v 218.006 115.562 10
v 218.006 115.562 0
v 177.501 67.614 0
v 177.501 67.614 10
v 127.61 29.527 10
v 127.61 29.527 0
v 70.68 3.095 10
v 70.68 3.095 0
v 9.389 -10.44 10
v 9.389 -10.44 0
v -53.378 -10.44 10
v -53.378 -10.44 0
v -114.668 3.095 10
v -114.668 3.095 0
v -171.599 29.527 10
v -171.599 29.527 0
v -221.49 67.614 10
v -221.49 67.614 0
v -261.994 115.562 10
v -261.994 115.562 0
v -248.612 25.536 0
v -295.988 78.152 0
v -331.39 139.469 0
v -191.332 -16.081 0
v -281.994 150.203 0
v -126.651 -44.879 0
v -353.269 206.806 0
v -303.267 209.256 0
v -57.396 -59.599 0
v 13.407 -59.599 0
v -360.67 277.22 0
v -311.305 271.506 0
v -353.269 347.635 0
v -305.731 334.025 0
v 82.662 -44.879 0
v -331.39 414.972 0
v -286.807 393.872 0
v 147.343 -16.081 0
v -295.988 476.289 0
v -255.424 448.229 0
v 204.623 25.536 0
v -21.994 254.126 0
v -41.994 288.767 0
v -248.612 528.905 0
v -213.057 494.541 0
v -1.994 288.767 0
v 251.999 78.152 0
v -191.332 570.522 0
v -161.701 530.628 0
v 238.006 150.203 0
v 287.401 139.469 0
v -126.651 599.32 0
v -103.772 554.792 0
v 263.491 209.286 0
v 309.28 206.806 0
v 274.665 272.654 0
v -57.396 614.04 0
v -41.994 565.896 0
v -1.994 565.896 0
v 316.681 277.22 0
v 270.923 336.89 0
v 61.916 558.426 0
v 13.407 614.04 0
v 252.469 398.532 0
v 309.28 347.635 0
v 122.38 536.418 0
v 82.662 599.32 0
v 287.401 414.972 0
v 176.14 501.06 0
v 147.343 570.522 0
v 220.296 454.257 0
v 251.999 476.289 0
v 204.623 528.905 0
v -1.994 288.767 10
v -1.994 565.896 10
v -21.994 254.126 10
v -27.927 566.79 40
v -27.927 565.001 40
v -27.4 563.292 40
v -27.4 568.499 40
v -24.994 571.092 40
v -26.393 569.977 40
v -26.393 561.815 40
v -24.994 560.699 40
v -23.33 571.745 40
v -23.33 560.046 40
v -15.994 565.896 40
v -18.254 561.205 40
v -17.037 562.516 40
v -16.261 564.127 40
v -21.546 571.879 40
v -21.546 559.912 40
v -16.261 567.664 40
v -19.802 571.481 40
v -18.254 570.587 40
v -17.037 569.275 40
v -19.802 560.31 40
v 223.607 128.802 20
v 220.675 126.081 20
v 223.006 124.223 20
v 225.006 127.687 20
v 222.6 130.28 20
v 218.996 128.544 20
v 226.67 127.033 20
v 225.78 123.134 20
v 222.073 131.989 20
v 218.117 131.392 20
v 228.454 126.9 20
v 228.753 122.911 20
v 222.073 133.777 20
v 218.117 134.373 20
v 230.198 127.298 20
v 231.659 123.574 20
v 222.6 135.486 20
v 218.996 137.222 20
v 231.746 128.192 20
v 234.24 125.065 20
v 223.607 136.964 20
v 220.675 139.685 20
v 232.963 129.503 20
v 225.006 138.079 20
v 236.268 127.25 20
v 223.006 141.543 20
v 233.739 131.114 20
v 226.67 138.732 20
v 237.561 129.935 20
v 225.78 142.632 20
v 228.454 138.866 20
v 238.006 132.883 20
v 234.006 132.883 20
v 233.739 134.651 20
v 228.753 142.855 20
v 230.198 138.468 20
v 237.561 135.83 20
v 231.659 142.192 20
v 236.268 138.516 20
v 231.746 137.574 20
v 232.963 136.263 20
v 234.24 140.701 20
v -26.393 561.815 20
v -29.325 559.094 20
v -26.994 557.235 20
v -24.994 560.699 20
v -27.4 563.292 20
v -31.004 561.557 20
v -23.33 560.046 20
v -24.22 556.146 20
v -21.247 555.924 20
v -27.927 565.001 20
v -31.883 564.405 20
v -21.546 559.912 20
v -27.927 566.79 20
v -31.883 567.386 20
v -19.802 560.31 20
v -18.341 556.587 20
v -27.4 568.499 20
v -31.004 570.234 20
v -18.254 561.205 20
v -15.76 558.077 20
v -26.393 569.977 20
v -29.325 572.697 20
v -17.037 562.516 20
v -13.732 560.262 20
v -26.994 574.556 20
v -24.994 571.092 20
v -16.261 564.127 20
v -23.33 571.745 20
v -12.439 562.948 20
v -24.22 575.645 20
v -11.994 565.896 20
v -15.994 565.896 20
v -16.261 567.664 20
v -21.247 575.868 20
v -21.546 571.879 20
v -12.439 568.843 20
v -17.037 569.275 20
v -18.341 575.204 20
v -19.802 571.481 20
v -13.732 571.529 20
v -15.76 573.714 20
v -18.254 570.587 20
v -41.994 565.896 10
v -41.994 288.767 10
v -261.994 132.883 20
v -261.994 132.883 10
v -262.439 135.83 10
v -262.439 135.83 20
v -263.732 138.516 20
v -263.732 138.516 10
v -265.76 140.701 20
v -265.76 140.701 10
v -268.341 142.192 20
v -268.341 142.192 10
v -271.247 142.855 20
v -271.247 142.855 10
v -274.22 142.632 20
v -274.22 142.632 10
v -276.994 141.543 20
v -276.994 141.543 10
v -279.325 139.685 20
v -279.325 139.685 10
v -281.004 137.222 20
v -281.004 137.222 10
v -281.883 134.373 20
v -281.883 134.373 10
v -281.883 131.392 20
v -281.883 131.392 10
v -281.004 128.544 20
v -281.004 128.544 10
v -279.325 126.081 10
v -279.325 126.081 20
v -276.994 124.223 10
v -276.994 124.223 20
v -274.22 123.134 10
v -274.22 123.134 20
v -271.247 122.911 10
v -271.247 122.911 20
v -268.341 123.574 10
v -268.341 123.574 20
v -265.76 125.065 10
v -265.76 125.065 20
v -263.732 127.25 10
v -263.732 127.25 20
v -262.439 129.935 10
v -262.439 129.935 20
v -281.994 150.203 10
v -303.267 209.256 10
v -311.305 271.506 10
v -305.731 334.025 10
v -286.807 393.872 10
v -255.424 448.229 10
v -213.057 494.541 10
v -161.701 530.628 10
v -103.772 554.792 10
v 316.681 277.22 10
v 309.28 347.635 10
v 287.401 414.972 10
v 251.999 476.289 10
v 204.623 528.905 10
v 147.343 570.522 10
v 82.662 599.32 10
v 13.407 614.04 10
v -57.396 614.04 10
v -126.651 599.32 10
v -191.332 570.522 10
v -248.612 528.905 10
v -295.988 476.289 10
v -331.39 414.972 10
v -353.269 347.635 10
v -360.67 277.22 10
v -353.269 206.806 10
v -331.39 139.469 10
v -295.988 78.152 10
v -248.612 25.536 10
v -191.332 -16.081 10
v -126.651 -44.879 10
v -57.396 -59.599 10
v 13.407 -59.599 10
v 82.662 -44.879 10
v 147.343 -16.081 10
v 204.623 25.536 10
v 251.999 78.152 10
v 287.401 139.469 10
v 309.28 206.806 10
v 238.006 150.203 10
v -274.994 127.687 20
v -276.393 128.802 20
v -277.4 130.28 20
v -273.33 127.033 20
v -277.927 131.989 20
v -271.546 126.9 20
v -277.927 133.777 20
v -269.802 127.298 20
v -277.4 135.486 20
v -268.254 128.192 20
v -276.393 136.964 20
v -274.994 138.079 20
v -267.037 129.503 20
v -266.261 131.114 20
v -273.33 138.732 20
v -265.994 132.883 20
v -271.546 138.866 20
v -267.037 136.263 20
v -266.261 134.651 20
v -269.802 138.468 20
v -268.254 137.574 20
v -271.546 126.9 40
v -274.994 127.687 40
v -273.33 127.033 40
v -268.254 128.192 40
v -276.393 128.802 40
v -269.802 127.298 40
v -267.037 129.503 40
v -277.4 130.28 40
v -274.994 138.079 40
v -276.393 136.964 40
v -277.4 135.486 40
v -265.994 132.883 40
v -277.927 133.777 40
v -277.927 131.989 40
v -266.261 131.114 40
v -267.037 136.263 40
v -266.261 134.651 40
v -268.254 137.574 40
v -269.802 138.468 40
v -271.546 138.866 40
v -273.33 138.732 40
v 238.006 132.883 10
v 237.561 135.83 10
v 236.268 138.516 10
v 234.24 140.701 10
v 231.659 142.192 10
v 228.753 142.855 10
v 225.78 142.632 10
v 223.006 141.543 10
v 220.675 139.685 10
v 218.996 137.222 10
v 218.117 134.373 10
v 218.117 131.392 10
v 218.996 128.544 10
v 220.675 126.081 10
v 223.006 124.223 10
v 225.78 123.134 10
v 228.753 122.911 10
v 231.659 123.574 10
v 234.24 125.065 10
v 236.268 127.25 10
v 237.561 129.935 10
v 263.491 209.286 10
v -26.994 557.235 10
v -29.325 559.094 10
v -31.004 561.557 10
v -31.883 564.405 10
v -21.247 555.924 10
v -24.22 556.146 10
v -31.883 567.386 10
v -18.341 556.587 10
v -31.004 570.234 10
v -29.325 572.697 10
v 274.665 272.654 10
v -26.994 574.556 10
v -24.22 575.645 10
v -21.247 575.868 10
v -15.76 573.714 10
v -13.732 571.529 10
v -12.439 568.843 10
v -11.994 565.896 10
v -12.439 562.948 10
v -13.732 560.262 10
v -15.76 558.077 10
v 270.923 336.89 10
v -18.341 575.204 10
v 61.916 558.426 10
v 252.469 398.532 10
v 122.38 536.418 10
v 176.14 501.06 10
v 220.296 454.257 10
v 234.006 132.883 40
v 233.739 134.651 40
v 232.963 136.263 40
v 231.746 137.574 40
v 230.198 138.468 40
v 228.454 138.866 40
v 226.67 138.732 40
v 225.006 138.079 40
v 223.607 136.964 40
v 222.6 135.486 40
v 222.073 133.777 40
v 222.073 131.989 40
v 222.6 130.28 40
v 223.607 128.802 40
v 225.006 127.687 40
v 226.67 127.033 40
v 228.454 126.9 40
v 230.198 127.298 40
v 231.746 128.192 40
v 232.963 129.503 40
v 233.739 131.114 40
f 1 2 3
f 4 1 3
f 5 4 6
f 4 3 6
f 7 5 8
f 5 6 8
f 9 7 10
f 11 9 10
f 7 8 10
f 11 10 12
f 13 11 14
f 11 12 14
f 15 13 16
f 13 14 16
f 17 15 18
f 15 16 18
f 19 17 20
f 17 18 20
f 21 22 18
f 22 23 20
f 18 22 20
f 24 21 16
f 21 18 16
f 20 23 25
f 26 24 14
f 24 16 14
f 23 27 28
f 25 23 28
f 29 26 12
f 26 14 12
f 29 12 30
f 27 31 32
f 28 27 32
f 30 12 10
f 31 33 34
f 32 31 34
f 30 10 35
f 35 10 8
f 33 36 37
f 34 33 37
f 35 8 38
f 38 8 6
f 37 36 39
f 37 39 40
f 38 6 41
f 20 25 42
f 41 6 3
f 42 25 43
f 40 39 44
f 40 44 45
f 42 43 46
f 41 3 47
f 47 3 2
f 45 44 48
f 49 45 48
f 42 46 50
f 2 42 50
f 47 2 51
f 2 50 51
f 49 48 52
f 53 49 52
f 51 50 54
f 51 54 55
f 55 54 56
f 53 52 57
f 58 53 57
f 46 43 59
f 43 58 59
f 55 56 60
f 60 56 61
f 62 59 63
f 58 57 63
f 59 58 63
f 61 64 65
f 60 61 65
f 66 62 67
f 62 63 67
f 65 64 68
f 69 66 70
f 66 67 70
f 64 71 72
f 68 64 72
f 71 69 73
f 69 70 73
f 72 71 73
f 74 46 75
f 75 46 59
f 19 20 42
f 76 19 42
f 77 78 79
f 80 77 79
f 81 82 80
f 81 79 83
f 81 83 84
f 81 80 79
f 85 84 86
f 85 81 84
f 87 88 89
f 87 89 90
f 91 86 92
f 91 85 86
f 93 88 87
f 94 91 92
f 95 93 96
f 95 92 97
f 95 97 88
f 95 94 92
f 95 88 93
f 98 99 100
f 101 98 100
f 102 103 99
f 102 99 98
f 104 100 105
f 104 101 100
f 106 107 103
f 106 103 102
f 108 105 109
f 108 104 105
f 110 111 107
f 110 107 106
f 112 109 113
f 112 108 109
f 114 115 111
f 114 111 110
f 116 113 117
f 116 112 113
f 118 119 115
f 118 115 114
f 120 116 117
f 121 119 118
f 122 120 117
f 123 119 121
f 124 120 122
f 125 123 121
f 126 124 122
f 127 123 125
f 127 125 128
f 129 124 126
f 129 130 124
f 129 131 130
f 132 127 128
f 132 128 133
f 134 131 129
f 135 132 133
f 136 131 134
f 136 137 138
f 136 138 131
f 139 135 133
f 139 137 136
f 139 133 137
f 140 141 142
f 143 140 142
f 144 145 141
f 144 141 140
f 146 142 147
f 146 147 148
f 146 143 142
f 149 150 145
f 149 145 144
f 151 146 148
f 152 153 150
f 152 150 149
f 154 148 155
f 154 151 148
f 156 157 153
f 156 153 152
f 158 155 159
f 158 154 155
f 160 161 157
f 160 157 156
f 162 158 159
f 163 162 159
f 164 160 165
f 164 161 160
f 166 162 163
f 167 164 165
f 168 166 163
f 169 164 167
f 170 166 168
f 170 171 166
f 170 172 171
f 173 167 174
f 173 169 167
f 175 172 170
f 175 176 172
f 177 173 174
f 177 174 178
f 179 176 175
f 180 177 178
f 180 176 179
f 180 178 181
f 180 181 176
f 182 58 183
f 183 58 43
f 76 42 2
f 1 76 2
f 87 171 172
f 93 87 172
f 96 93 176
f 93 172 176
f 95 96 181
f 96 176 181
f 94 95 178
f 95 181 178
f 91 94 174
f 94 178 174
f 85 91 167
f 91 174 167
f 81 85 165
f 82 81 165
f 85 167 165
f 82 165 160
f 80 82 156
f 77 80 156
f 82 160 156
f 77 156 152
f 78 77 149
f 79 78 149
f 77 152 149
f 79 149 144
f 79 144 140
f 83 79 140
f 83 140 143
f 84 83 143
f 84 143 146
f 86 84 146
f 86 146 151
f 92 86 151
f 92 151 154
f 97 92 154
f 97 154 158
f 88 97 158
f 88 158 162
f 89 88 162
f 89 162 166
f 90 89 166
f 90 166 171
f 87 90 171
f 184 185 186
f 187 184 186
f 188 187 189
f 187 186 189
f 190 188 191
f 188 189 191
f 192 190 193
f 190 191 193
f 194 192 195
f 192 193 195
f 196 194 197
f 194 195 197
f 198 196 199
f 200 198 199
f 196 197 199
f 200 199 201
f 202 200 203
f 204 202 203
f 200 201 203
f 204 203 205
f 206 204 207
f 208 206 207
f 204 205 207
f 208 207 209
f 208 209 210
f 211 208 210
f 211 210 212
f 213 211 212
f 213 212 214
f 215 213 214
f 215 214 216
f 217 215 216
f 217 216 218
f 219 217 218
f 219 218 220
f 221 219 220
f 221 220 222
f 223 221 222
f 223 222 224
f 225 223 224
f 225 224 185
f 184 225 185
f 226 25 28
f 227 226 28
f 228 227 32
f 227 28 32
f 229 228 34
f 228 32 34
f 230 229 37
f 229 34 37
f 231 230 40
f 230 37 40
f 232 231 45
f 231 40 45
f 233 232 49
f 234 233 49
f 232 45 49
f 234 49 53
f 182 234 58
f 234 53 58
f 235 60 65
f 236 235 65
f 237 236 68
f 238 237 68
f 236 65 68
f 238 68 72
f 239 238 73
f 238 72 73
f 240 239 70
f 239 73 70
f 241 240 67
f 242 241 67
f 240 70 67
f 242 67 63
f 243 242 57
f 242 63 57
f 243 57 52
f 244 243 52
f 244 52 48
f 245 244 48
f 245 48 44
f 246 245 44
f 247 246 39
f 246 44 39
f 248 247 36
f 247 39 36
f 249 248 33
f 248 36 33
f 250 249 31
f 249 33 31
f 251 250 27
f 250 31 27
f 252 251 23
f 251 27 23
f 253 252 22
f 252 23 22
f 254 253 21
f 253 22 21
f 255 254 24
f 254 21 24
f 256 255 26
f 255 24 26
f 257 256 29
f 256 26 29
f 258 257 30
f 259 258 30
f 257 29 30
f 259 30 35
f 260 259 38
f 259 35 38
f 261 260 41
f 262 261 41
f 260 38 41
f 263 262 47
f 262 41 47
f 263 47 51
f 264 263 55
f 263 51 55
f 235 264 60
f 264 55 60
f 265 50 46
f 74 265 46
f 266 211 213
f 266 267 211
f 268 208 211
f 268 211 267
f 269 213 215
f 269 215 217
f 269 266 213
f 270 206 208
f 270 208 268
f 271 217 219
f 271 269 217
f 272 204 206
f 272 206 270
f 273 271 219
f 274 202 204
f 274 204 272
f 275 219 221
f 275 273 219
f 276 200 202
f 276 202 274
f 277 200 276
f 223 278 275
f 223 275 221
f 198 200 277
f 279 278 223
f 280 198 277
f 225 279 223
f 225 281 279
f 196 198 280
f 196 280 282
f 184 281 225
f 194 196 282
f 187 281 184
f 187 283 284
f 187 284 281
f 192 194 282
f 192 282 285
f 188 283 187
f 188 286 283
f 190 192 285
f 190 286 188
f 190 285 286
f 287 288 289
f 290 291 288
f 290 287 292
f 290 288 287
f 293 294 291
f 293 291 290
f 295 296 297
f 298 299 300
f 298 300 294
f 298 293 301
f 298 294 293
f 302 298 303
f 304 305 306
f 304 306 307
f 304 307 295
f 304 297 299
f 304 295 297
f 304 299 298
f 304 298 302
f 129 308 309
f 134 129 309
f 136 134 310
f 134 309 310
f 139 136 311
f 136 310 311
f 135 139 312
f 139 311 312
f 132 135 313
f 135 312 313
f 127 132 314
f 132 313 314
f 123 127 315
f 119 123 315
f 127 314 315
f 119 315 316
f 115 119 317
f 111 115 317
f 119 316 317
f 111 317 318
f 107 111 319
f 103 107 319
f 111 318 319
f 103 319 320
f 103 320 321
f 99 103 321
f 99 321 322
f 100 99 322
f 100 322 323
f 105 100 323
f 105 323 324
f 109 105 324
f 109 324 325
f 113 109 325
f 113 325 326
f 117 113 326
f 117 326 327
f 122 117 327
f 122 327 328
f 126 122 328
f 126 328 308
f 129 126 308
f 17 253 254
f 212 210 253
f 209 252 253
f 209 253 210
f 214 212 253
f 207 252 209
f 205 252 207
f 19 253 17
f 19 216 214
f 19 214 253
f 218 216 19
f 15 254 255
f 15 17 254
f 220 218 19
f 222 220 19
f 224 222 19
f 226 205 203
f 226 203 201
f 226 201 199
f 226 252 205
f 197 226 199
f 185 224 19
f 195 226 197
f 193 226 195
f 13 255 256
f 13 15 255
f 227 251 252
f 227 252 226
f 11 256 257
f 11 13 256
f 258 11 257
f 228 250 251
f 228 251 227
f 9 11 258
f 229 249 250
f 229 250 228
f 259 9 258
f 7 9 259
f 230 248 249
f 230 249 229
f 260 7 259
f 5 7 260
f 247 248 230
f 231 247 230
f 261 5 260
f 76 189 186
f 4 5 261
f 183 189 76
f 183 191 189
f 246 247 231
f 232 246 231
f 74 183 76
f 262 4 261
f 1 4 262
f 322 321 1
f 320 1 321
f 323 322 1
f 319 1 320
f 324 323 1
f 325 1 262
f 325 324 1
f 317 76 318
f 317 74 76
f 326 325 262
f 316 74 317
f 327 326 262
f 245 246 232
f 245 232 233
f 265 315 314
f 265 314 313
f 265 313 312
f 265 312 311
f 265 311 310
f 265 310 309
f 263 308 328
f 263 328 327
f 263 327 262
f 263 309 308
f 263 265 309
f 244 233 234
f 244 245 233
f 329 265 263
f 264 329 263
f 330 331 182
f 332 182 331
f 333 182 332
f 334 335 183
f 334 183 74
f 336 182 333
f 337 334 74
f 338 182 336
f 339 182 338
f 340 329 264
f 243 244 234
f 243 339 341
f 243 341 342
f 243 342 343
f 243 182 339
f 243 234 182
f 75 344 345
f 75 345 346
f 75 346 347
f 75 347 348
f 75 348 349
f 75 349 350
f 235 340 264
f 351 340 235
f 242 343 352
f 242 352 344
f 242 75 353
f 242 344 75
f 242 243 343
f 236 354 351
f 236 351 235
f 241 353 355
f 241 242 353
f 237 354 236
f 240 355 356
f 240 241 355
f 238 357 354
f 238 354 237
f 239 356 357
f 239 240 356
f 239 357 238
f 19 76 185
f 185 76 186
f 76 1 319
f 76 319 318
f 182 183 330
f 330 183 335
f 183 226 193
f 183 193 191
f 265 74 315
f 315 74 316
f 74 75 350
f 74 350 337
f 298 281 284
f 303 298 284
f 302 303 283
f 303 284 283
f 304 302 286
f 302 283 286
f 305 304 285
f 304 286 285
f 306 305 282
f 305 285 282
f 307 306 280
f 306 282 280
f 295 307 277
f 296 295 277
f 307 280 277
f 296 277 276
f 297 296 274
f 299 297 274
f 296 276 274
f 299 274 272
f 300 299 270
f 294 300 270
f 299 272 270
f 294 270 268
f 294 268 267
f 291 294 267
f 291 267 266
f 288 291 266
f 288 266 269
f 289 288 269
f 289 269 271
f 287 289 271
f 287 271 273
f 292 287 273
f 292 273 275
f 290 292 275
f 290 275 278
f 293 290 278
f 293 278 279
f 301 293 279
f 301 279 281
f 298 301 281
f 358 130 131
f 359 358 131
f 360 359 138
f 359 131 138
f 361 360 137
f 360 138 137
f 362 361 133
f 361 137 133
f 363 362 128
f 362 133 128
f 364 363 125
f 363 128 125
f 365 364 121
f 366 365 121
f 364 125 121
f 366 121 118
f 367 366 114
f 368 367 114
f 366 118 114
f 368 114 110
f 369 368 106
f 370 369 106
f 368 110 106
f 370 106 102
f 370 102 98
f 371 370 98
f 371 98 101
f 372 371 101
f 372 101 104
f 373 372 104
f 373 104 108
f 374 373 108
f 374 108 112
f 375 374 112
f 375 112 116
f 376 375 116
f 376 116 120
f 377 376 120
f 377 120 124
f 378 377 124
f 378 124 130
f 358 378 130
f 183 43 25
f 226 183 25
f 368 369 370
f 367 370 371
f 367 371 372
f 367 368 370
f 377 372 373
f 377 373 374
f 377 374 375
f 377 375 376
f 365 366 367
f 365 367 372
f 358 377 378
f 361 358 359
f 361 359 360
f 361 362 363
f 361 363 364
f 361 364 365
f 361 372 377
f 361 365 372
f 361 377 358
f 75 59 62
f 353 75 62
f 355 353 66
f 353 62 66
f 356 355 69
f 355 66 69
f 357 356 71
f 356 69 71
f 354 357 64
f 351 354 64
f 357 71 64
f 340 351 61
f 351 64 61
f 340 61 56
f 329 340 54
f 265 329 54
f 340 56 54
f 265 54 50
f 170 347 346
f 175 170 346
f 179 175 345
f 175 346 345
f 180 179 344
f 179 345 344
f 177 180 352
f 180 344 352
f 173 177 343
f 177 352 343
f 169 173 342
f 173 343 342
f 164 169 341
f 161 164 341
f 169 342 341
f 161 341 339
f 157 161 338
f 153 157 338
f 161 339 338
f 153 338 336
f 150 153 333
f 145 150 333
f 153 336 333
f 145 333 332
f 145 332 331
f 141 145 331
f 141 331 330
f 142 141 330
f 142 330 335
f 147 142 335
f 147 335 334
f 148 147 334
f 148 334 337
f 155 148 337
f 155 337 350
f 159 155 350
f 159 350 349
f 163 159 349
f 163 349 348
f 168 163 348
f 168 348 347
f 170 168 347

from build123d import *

# Parameters (mm, degrees)
SKETCH1_R           = 338.675134595
BOSS_EXTRUDE1_DEPTH = 10
SKETCH1_4_R         = 6
BOSS_EXTRUDE2_DEPTH = 40
SKETCH1_5_R         = 10
BOSS_EXTRUDE3_DEPTH = 20


with BuildPart() as part:
    # Sketch1 → Boss-Extrude1 (new body)
    with BuildSketch(Plane.XY):
        with Locations((-21.994465127, 277.22041187)):
            Circle(SKETCH1_R)
        with BuildLine():
            Line((-261.994465127, 115.562336497), (-21.994465127, 254.126401103))
            Line((-21.994465127, 254.126401103), (218.005534873, 115.562336497))
            ThreePointArc((218.005534873, 115.562336497), (-21.994465127, -12.146713653), (-261.994465127, 115.562336497))
        make_face(mode=Mode.SUBTRACT)
        with BuildLine():
            Line((-41.994465127, 565.895546465), (-41.994465127, 288.767417254))
            Line((-41.994465127, 288.767417254), (-281.994465127, 150.203352649))
            ThreePointArc((-281.994465127, 150.203352649), (-272.59374685, 421.903974632), (-41.994465127, 565.895546465))
        make_face(mode=Mode.SUBTRACT)
        with BuildLine():
            Line((238.005534873, 150.203352649), (-1.994465127, 288.767417254))
            Line((-1.994465127, 288.767417254), (-1.994465127, 565.895546465))
            ThreePointArc((-1.994465127, 565.895546465), (238.005534873, 427.33148186), (238.005534873, 150.203352649))
        make_face(mode=Mode.SUBTRACT)
    extrude(amount=BOSS_EXTRUDE1_DEPTH)

    # Sketch1<4> → Boss-Extrude2 (add)
    with BuildSketch(Plane.XY):
        with Locations((228.005534873, 132.882844573)):
            Circle(SKETCH1_4_R)
        with Locations((-271.994465127, 132.882844573)):
            Circle(SKETCH1_4_R)
        with Locations((-21.994465127, 565.895546465)):
            Circle(SKETCH1_4_R)
    extrude(amount=BOSS_EXTRUDE2_DEPTH)

    # Sketch1<5> → Boss-Extrude3 (add)
    with BuildSketch(Plane.XY):
        with Locations((-271.994465127, 132.882844573)):
            Circle(SKETCH1_5_R)
        with Locations((-21.994465127, 565.895546465)):
            Circle(SKETCH1_5_R)
        with Locations((228.005534873, 132.882844573)):
            Circle(SKETCH1_5_R)
    extrude(amount=BOSS_EXTRUDE3_DEPTH)


solid = part.part
